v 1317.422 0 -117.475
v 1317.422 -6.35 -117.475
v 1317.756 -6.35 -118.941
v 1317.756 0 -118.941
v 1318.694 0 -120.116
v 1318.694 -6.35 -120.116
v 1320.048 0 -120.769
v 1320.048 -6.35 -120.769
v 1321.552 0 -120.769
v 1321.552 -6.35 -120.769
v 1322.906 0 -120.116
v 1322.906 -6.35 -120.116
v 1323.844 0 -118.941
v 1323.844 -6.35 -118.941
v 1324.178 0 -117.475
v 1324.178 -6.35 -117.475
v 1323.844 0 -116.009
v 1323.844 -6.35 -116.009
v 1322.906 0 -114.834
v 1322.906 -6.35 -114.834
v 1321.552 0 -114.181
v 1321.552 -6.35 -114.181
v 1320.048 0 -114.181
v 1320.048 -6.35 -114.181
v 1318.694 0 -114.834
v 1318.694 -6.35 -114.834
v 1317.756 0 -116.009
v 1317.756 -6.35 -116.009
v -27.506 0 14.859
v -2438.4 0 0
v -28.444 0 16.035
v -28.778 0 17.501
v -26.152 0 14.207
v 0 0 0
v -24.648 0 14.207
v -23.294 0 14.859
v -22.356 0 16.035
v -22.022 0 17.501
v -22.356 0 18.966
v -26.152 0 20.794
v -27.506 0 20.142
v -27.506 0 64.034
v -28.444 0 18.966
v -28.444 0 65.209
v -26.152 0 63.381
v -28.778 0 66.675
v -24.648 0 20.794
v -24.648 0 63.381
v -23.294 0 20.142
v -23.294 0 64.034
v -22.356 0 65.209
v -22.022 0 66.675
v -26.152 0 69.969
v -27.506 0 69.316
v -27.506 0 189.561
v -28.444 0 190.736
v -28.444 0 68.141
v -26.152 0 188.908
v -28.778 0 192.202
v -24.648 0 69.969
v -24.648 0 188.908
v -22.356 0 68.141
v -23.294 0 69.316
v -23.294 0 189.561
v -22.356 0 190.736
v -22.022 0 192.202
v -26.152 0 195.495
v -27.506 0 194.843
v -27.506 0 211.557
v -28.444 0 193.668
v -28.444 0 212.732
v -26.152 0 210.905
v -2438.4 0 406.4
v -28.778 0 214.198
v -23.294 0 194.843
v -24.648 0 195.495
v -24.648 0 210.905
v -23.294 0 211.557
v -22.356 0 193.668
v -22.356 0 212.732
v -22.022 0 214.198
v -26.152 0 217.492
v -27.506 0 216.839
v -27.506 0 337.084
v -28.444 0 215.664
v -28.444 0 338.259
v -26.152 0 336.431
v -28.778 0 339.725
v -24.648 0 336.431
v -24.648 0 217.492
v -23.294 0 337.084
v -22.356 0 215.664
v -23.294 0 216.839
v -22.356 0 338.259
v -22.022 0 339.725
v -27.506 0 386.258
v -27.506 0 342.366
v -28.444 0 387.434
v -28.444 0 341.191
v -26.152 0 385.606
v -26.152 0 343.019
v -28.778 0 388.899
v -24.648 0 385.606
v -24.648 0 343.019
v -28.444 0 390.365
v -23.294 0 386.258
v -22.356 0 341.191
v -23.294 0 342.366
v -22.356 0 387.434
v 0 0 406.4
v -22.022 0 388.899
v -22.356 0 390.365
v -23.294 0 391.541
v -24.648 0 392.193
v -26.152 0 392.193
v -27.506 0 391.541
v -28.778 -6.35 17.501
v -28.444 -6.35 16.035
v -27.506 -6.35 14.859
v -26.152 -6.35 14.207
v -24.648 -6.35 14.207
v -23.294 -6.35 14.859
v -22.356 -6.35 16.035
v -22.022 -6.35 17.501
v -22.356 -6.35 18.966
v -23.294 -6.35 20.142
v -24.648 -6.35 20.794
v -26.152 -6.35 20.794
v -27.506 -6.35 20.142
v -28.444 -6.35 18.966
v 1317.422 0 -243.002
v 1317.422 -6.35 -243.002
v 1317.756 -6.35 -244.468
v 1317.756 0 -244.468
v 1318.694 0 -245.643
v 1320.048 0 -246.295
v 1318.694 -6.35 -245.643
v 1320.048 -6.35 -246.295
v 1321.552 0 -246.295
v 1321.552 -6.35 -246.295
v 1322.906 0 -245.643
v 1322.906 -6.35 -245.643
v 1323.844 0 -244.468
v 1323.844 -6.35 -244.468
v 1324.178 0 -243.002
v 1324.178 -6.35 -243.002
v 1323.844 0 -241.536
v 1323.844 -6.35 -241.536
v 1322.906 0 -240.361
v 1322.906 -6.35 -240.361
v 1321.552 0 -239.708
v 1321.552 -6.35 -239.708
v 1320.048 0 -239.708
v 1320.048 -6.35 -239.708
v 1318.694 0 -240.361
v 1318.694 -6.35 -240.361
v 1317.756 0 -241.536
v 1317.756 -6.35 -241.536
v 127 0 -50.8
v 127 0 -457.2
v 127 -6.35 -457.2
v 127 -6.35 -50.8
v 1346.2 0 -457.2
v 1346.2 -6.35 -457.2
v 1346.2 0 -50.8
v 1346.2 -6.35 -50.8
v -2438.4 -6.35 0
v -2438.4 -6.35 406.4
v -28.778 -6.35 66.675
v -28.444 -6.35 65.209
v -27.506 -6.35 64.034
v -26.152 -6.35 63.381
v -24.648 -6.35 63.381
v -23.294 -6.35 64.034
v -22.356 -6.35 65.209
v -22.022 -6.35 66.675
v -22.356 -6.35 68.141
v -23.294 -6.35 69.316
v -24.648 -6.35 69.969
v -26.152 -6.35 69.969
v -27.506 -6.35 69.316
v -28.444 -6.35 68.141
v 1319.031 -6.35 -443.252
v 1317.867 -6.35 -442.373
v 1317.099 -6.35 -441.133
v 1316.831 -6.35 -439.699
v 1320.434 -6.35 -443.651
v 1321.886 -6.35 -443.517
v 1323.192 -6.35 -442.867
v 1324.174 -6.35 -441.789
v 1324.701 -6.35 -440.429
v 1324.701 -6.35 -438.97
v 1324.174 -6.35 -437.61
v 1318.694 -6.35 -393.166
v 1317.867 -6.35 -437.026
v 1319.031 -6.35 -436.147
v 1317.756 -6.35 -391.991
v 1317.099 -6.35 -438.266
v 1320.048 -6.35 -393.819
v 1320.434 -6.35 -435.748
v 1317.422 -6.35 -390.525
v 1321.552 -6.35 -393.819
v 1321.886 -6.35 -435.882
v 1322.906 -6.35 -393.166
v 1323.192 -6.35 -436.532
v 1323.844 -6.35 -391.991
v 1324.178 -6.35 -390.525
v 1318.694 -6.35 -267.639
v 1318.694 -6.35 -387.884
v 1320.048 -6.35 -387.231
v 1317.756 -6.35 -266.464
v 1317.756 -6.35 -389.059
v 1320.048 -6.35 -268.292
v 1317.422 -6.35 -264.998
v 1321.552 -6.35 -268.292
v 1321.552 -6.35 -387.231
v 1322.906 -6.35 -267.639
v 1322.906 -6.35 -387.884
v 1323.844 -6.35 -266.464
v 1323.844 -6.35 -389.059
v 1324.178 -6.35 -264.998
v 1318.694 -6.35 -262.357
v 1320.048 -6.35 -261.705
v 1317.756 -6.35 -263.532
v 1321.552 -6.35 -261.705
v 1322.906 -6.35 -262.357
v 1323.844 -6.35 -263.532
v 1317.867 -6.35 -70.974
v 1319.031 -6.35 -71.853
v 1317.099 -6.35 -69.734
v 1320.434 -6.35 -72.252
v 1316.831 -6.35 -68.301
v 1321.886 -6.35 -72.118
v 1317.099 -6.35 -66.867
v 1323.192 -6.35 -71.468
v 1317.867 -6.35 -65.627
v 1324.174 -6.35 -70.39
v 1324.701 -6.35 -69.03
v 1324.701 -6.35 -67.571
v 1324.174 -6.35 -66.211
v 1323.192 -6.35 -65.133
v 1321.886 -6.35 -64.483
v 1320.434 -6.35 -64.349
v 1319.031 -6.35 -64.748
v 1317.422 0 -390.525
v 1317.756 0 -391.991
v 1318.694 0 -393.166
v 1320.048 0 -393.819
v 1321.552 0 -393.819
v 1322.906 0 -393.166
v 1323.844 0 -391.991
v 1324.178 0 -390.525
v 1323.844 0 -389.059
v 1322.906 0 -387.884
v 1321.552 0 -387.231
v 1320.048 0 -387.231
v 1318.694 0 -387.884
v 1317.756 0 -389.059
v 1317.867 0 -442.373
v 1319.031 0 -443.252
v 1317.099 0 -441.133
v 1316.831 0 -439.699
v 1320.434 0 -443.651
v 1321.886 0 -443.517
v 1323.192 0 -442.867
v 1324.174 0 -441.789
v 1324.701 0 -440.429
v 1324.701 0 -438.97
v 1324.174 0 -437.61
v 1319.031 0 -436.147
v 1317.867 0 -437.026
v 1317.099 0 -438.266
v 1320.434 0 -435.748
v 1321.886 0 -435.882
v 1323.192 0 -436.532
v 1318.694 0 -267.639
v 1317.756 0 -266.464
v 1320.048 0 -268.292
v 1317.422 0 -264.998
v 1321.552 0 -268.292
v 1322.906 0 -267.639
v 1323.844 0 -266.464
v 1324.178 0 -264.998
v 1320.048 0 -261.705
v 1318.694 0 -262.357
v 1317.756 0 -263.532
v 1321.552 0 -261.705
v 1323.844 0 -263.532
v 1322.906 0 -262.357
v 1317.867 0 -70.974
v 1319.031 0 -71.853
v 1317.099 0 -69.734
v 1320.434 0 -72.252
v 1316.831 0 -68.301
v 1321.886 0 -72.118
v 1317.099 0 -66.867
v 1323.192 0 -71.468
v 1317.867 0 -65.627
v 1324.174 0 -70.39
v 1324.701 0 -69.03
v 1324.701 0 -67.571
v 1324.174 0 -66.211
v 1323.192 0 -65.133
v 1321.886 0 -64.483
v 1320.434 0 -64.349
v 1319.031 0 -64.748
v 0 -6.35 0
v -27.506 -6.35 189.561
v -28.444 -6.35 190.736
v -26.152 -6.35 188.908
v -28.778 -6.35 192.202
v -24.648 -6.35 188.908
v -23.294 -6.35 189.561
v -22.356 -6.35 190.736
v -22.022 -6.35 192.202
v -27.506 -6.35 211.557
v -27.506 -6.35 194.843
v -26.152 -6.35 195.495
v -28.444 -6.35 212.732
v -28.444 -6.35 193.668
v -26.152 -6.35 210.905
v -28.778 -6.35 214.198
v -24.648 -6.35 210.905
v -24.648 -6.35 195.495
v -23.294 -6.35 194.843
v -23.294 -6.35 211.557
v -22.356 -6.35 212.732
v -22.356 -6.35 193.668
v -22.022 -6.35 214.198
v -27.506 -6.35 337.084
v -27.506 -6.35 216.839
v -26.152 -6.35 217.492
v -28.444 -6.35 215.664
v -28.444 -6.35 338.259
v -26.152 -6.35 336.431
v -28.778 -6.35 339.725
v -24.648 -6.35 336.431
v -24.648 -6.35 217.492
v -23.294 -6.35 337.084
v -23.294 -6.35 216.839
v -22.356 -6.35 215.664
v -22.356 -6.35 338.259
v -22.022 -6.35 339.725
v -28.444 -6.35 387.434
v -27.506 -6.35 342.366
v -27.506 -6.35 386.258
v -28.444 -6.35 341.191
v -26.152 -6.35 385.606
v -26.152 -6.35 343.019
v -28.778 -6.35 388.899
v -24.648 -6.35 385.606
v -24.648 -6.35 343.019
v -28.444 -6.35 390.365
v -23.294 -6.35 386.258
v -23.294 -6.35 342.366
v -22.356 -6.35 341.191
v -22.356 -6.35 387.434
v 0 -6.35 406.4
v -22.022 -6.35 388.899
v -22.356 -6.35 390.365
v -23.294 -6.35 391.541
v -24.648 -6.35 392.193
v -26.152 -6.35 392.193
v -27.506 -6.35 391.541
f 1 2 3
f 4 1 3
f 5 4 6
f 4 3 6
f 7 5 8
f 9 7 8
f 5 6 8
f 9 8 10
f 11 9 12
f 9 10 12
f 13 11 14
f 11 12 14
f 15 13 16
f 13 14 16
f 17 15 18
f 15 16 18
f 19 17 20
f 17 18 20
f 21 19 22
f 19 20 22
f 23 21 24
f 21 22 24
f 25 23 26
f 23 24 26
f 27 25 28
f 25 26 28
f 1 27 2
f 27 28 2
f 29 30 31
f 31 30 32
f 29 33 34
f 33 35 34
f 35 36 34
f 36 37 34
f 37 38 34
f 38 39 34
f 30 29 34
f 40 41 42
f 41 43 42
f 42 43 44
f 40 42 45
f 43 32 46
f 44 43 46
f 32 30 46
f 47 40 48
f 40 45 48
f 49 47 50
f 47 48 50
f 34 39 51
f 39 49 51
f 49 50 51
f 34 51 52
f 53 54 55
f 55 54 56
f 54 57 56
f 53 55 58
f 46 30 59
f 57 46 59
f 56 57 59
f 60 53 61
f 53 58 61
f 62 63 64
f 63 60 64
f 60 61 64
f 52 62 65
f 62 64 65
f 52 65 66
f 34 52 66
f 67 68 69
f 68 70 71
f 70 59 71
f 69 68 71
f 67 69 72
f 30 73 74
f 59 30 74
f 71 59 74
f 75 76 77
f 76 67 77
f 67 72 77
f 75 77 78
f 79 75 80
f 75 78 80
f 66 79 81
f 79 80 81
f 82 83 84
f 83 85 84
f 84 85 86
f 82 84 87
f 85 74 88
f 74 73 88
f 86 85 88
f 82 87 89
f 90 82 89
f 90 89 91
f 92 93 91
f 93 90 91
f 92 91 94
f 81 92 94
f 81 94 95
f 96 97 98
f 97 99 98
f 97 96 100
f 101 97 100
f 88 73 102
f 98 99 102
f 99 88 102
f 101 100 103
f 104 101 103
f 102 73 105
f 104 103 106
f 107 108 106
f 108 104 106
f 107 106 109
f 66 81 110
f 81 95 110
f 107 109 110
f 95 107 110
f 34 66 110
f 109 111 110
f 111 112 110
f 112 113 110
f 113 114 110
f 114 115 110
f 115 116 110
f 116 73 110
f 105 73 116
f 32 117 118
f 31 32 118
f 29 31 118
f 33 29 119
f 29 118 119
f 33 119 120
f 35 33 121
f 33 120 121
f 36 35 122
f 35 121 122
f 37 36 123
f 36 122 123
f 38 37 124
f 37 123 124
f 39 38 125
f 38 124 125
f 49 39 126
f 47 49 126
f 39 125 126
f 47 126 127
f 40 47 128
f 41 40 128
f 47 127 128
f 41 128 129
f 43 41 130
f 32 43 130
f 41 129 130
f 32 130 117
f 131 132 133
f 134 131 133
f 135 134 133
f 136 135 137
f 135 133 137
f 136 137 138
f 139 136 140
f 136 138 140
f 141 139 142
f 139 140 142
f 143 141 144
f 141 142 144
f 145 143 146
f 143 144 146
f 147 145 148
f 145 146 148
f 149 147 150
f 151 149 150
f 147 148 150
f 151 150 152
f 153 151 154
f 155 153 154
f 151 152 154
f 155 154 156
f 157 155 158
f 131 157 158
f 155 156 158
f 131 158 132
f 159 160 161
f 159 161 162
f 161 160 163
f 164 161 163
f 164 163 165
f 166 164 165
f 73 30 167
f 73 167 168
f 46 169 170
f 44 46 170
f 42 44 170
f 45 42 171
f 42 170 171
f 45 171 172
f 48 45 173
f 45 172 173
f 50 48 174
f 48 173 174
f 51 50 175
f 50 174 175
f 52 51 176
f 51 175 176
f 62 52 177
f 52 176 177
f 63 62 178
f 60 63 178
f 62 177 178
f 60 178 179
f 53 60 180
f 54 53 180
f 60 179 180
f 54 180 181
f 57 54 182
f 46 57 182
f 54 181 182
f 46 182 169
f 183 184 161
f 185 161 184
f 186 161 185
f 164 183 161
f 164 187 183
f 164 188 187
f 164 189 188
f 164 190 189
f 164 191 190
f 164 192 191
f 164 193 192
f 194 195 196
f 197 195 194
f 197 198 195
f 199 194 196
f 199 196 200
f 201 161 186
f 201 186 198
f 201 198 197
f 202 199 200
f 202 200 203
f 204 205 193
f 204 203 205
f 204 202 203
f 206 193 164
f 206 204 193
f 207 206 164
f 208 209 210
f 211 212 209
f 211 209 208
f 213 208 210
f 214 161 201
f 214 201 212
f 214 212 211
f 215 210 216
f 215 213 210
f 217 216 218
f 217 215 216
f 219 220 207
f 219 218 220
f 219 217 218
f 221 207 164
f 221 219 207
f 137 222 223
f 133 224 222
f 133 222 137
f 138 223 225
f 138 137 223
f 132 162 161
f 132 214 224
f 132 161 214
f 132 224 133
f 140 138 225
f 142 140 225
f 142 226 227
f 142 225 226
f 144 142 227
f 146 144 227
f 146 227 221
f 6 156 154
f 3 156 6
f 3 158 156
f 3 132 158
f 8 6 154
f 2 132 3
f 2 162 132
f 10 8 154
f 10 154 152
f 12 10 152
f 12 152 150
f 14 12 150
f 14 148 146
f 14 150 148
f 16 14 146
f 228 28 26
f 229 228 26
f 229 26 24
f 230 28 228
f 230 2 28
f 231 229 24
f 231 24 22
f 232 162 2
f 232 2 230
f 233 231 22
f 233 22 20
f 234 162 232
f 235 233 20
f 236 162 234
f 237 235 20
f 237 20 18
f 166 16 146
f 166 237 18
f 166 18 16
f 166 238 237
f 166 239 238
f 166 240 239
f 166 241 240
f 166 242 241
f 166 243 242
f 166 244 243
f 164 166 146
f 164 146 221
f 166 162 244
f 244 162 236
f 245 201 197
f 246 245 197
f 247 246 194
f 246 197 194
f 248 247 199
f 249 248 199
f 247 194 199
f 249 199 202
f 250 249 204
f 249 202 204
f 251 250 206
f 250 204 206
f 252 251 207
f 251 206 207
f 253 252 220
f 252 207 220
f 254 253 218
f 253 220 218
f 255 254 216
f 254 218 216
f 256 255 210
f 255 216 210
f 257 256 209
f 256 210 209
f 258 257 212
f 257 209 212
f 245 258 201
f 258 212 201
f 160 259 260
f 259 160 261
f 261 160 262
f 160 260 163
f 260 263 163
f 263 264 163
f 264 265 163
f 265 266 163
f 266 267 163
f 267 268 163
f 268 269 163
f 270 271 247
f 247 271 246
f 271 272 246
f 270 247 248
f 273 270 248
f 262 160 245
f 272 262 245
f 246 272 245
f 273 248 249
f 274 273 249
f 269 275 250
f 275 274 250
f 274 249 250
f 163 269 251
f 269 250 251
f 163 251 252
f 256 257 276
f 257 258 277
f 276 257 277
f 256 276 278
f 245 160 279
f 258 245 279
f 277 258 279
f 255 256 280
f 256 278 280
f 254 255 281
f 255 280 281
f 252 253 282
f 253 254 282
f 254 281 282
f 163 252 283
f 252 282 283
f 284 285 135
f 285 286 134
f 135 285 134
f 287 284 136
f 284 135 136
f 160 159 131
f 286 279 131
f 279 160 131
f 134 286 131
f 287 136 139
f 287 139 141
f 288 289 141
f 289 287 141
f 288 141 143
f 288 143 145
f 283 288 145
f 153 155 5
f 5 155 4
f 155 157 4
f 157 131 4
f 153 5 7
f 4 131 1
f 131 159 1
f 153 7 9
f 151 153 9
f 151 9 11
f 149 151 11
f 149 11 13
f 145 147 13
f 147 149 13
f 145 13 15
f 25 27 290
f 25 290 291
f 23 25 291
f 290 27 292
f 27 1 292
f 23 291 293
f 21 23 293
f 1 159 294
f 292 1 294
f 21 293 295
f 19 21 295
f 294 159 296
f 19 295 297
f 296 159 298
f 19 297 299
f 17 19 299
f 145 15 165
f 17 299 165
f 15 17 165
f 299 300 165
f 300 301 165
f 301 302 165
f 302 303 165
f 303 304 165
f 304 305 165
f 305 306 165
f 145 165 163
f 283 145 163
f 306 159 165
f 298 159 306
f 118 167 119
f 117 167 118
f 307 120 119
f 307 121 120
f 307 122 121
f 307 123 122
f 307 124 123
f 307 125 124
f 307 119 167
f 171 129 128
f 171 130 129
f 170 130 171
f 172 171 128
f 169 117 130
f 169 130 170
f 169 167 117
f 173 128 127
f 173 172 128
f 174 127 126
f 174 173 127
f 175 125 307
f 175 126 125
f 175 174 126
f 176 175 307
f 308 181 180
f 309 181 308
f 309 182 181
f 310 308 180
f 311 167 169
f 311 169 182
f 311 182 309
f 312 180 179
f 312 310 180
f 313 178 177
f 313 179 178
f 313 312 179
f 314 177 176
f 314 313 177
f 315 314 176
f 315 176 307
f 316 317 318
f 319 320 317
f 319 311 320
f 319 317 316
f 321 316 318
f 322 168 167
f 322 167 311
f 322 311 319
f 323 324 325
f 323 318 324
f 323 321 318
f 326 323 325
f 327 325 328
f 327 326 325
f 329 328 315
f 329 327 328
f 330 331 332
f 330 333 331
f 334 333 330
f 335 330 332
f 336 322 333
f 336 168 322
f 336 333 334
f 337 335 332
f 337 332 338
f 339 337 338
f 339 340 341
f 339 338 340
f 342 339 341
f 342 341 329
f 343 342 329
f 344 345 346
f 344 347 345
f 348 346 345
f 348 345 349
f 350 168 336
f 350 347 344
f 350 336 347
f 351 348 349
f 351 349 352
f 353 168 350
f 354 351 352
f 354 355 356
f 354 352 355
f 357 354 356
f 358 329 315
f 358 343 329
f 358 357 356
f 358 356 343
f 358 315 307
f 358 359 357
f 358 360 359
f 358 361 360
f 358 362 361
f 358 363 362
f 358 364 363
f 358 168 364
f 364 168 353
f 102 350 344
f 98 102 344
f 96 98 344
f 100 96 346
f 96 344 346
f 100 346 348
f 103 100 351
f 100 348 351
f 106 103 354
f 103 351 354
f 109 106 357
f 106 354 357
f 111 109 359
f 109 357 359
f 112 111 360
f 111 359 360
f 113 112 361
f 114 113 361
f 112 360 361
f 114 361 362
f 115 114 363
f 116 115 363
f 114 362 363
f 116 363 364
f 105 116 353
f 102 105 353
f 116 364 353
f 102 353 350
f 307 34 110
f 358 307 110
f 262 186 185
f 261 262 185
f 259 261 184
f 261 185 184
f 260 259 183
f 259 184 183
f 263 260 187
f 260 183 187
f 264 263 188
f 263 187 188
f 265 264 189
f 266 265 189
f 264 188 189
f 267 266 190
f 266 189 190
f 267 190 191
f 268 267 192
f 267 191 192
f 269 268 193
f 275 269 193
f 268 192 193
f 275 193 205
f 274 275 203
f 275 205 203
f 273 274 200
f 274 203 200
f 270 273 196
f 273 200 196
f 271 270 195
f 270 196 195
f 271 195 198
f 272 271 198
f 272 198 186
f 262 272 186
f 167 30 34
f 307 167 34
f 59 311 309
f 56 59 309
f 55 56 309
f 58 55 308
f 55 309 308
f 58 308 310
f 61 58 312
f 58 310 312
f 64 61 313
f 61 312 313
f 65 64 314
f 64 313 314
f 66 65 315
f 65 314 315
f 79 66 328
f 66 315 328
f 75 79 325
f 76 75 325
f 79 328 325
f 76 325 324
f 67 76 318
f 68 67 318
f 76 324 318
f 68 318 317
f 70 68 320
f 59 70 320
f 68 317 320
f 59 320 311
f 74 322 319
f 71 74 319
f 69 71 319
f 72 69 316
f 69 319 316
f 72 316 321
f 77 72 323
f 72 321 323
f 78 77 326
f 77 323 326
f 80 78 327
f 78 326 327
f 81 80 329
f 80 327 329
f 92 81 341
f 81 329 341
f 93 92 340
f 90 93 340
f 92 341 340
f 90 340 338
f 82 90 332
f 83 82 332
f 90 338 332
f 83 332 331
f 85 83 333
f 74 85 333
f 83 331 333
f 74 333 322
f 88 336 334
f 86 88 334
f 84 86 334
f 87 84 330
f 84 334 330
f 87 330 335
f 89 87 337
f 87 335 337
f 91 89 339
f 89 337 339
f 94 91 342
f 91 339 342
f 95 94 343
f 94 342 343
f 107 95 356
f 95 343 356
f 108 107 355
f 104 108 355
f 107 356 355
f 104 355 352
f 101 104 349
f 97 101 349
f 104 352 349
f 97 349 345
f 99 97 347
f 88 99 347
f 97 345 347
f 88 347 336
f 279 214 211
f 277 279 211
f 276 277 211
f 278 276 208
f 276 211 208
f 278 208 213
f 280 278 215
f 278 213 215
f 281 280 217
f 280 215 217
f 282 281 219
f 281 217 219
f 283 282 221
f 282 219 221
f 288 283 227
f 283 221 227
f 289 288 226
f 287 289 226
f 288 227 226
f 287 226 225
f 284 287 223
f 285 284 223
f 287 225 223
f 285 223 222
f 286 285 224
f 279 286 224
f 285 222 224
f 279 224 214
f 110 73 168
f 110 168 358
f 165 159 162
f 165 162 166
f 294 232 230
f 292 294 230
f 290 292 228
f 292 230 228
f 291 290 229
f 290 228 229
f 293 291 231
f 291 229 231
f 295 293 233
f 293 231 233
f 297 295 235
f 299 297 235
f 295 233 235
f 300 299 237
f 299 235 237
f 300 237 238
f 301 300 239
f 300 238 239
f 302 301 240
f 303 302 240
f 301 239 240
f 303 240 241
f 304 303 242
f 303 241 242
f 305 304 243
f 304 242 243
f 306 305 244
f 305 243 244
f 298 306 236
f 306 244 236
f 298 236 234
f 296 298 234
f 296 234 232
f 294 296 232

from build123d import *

# Parameters (mm, degrees)
F0_W     = 2438.4
F0_H     = 406.4
F1_DEPTH = 6.35
F2_W     = 1219.2
F2_H     = 406.4
F3_DEPTH = 6.35
F4_D     = 7.9375
F4_DEPTH = 20.6248
F4_TIP   = 2.3846655818
F5_D     = 6.7564
F5_DEPTH = 19.6723
F5_TIP   = 2.0298273432
F6_D     = 6.7564
F6_DEPTH = 19.685
F6_TIP   = 2.0298273432
F7_D     = 6.7564
F7_DEPTH = 19.685
F7_TIP   = 2.0298273432
F8_D     = 6.7564
F8_DEPTH = 19.685
F8_TIP   = 2.0298273432


with BuildPart() as f1:
    # F0 (on Front) → F1 (new body)
    with BuildSketch(Plane.XZ):
        with Locations((-1219.2, 203.2)):
            Rectangle(F0_W, F0_H)
    extrude(amount=F1_DEPTH)

    # F6
    with Locations(Plane(origin=(0, 0, 0), x_dir=(1, 0, 0), z_dir=(0, 1, 0))):
        with Locations((-25.4, -388.8994), (-25.4, -339.725), (-25.4, -66.675), (-25.4, -17.5006)):
            Hole(F6_D / 2, depth=F6_DEPTH)
            with Locations((0, 0, -(F6_DEPTH + F6_TIP / 2))):  # 118° drill point
                Cone(0, F6_D / 2, F6_TIP, mode=Mode.SUBTRACT)

    # F7
    with Locations(Plane(origin=(0, 0, 0), x_dir=(1, 0, 0), z_dir=(0, 1, 0))):
        with Locations((-25.4, -214.1982), (-25.4, -192.2018)):
            Hole(F7_D / 2, depth=F7_DEPTH)
            with Locations((0, 0, -(F7_DEPTH + F7_TIP / 2))):  # 118° drill point
                Cone(0, F7_D / 2, F7_TIP, mode=Mode.SUBTRACT)


with BuildPart() as f3:
    # F2 (on Front) → F3 (new body)
    with BuildSketch(Plane.XZ):
        with Locations((736.6, -254)):
            Rectangle(F2_W, F2_H)
    extrude(amount=F3_DEPTH)

    # F4
    with Locations(Plane(origin=(0, 0, 0), x_dir=(1, 0, 0), z_dir=(0, 1, 0))):
        with Locations((1320.8, 68.3006), (1320.8, 439.6994)):
            Hole(F4_D / 2, depth=F4_DEPTH)
            with Locations((0, 0, -(F4_DEPTH + F4_TIP / 2))):  # 118° drill point
                Cone(0, F4_D / 2, F4_TIP, mode=Mode.SUBTRACT)

    # F5
    with Locations(Plane(origin=(0, 0, 0), x_dir=(1, 0, 0), z_dir=(0, 1, 0))):
        with Locations((1320.8, 68.3006), (1320.8, 117.475), (1320.8, 390.525), (1320.8, 439.6994)):
            Hole(F5_D / 2, depth=F5_DEPTH)
            with Locations((0, 0, -(F5_DEPTH + F5_TIP / 2))):  # 118° drill point
                Cone(0, F5_D / 2, F5_TIP, mode=Mode.SUBTRACT)

    # F8
    with Locations(Plane(origin=(0, 0, 0), x_dir=(1, 0, 0), z_dir=(0, 1, 0))):
        with Locations((1320.8, 243.0018), (1320.8, 264.9982)):
            Hole(F8_D / 2, depth=F8_DEPTH)
            with Locations((0, 0, -(F8_DEPTH + F8_TIP / 2))):  # 118° drill point
                Cone(0, F8_D / 2, F8_TIP, mode=Mode.SUBTRACT)


solid = Compound([f1.part, f3.part])
